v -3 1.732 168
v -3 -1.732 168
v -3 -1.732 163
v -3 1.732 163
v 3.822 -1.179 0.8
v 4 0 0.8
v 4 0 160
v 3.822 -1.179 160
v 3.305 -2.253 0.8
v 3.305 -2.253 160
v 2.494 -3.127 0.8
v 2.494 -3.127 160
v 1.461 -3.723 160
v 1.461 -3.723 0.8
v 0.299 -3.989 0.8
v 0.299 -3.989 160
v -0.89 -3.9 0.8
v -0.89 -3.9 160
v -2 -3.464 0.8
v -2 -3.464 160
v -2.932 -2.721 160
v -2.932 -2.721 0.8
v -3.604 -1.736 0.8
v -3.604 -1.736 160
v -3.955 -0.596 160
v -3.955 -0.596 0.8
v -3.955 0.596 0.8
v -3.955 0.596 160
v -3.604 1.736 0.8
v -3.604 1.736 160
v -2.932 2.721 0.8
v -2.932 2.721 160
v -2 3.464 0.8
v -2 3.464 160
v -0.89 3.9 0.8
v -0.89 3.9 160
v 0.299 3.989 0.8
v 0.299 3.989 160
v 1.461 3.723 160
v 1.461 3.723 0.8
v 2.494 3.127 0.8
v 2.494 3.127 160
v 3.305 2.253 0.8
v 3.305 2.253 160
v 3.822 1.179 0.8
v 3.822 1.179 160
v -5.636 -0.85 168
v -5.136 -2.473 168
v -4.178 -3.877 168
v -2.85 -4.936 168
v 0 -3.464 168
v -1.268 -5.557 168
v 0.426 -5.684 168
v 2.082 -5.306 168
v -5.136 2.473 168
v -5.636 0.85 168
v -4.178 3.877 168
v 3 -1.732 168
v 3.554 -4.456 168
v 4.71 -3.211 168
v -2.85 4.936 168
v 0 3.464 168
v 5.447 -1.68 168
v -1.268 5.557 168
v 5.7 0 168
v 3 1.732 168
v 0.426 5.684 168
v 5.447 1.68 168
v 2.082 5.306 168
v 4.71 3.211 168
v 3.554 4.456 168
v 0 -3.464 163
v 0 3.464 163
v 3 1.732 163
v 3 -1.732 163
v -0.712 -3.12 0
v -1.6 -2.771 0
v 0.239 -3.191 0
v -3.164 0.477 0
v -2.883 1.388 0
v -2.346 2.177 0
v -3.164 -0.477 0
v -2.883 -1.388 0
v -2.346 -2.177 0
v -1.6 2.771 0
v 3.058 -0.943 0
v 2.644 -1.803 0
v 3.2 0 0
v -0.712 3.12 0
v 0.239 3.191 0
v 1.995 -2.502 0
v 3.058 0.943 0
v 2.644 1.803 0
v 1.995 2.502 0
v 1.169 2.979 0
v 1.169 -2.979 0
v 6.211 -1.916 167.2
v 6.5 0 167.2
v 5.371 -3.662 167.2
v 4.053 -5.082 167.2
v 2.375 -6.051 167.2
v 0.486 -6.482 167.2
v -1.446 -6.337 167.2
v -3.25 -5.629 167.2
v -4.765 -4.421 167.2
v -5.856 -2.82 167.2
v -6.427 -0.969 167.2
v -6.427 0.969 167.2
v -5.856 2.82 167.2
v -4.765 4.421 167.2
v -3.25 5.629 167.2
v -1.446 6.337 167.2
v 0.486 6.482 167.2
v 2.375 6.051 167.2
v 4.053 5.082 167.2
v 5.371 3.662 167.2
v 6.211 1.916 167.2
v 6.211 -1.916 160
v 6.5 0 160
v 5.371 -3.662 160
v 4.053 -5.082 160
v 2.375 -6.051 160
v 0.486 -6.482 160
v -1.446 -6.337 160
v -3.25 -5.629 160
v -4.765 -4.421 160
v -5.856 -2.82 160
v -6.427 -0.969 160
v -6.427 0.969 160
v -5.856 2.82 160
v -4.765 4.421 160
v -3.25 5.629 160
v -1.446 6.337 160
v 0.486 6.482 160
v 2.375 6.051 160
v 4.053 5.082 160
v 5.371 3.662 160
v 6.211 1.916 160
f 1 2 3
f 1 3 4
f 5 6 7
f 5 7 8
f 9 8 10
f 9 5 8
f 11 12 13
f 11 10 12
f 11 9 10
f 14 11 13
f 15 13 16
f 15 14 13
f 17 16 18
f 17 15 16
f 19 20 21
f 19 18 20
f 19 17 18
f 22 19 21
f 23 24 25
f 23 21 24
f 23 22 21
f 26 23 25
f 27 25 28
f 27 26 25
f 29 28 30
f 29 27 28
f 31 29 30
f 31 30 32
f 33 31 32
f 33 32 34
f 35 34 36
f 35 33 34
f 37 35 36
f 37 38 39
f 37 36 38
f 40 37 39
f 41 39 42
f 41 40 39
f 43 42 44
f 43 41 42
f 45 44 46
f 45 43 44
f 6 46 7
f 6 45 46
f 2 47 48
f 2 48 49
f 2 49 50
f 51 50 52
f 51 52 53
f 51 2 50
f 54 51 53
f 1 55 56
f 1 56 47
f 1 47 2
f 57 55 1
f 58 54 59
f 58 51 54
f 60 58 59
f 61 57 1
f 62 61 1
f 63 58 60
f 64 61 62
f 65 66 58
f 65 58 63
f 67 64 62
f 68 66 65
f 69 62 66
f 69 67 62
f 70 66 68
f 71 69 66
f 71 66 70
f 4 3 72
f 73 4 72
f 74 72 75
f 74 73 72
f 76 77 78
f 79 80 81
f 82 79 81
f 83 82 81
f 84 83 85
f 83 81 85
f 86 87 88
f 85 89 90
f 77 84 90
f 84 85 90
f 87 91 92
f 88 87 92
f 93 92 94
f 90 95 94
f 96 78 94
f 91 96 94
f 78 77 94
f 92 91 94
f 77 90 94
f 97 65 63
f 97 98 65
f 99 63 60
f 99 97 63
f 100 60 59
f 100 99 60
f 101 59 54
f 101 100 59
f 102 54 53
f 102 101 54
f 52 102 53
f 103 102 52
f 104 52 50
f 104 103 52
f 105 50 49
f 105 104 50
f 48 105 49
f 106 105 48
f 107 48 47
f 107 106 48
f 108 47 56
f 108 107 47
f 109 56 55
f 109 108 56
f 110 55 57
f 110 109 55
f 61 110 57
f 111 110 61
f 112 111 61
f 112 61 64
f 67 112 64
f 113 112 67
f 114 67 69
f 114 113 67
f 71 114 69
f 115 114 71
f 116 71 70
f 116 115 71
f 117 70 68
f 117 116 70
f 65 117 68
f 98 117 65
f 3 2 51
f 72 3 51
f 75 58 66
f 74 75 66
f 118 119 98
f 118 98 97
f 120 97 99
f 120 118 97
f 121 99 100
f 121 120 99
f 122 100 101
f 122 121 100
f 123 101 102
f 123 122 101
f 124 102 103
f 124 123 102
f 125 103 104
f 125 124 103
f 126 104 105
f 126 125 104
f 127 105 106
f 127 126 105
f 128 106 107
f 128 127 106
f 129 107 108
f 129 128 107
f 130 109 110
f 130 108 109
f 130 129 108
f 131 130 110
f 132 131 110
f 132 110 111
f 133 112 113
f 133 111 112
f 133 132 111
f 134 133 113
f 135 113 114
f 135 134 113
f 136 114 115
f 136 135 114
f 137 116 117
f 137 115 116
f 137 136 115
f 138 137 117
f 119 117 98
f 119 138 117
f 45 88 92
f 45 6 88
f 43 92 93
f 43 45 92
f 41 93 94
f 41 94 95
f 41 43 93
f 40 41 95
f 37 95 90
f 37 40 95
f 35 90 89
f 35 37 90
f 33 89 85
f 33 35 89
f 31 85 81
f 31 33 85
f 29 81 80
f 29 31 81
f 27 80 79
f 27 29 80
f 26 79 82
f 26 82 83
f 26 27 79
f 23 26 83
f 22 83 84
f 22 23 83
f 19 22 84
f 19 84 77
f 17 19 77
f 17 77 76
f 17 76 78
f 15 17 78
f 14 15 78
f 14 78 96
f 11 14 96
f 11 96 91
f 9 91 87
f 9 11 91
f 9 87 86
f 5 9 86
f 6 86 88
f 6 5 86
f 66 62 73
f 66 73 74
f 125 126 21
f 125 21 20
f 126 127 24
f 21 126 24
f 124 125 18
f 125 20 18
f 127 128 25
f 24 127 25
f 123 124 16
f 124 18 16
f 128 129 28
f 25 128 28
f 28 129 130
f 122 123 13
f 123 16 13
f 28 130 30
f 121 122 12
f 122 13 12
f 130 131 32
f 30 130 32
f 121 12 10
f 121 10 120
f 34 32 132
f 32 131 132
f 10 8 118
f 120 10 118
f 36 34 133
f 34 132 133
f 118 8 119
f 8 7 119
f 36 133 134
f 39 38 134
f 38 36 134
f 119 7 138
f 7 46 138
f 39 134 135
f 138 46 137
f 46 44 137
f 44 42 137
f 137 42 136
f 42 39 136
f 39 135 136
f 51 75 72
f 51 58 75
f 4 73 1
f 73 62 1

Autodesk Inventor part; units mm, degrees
ref_plane "YZ Plane" through (0, 0, 0) normal (1, 0, 0) x (0, 1, 0)
ref_plane "XZ Plane" through (0, 0, 0) normal (0, 1, 0) x (-1, 0, 0)
ref_plane "XY Plane" through (0, 0, 0) normal (0, 0, 1) x (1, 0, 0)
sketch "Sketch1" plane through (0, 0, 0) normal (0, 0, 1) x (1, 0, 0)
  circle A0 centre (0, 0) radius 4
  dimension "Diameter" = 8
extrude "Extrusion1" add sketch "Sketch1" along normal blind 160
sketch "Sketch2" plane through (0, 0, 160) normal (0, 0, 1) x (1, 0, 0)
  circle A0 centre (0, 0) radius 4 projected
  circle A1 centre (0, 0) radius 6.5
  dimension "Head_Diameter" = 13
extrude "Extrusion2" add sketch "Sketch2" along normal blind 8 contours A0 | A1
sketch "Sketch3" plane through (0, 0, 168) normal (0, 0, 1) x (1, 0, 0)
  circle A0 centre (0, 0) radius 6.5 projected
  circle A1 centre (0, 0) radius 3.4641 construction
  line L0 (0, 3.4641) -> (3, 1.7321)
  line L1 (3, -1.7321) -> (3, 1.7321)
  line L2 (0, 3.4641) -> (-3, 1.7321)
  line L3 (-3, -1.7321) -> (-3, 1.7321)
  line L4 (-3, -1.7321) -> (0, -3.4641)
  line L5 (3, -1.7321) -> (0, -3.4641)
  dimension "Hex_Width" = 6
extrude "Extrusion3" cut sketch "Sketch3" against normal blind 5 contours L0 L1 L5 L4 L3 L2
thread "Thread1" size "M8x1.25" class "4g6g" standard "ANSI Metric M Profile" length 32
chamfer "Chamfer1" distance 0.8 angle 45 2 edges at (-6.5, 0, 168) (-4, 0, 0)
equation "\"d9\" = ThreadLength"
equation "\"ThreadLength\" = 32"
properties part number "SCREW, SOCKET HD, P, 12.9, M8X1.25X160MM"
